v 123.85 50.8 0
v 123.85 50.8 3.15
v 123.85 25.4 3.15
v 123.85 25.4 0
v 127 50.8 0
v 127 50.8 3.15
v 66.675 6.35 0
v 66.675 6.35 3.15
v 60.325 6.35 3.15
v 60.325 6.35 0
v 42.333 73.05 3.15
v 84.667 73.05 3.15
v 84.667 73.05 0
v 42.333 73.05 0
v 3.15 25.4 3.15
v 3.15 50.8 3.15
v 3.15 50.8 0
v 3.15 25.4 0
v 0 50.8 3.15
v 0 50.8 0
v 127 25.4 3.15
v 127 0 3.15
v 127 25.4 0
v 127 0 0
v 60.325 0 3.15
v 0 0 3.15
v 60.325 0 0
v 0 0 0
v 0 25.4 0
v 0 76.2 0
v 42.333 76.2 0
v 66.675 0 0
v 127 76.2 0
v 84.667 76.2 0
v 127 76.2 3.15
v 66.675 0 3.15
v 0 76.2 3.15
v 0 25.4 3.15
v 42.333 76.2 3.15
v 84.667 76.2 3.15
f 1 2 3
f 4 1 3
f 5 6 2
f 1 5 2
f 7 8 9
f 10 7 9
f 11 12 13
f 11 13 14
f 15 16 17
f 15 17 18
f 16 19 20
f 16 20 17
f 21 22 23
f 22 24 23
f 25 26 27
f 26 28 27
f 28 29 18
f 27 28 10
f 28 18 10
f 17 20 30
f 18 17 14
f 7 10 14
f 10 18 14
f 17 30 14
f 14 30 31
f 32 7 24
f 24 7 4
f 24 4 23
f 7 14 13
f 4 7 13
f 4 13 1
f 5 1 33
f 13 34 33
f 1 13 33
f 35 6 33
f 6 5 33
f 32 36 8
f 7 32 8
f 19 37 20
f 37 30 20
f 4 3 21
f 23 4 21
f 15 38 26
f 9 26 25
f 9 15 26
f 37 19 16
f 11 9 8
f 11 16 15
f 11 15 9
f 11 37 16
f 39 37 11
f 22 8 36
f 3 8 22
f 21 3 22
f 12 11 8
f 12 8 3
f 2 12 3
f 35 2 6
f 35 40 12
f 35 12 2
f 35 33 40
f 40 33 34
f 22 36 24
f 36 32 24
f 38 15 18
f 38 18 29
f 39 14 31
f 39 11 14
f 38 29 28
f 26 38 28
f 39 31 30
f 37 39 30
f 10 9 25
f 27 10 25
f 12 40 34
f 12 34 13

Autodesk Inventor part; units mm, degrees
ref_plane "YZ Plane" through (0, 0, 0) normal (1, 0, 0) x (0, 1, 0)
ref_plane "XZ Plane" through (0, 0, 0) normal (0, 1, 0) x (-1, 0, 0)
ref_plane "XY Plane" through (0, 0, 0) normal (0, 0, 1) x (1, 0, 0)
sketch "Sketch1" plane through (0, 0, 0) normal (0, 0, 1) x (1, 0, 0)
  line L0 (0, 0) -> (127, 0)
  line L1 (127, 0) -> (127, 76.2)
  line L2 (127, 76.2) -> (0, 76.2)
  line L3 (0, 76.2) -> (0, 0)
  dimension "d0" = 127
  dimension "d1" = 76.2
extrude "Extrusion1" add sketch "Sketch1" along normal blind 3.1496
sketch "Sketch4" plane through (0, 0, 3.1496) normal (0, 0, 1) x (1, 0, 0)
  line L0 (0, 0) -> (127, 0) projected
  line L1 (127, 0) -> (127, 76.2) projected
  line L2 (127, 76.2) -> (0, 76.2) projected
  line L3 (0, 76.2) -> (0, 0) projected
  line L4 (0, 50.8) -> (3.1496, 50.8)
  line L5 (3.1496, 50.8) -> (3.1496, 25.4)
  line L6 (3.1496, 25.4) -> (0, 25.4)
  line L7 (0, 25.4) -> (0, 50.8)
  line L8 (127, 50.8) -> (123.8504, 50.8)
  line L9 (123.8504, 50.8) -> (123.8504, 25.4)
  line L10 (123.8504, 25.4) -> (127, 25.4)
  line L11 (127, 25.4) -> (127, 50.8)
  line L12 (42.3333, 76.2) -> (84.6667, 76.2)
  line L13 (84.6667, 76.2) -> (84.6667, 73.0504)
  line L14 (84.6667, 73.0504) -> (42.3333, 73.0504)
  line L15 (42.3333, 73.0504) -> (42.3333, 76.2)
  dimension "d7" = 3.1496
  dimension "d8" = 25.4
  dimension "d9" = 25.4
  dimension "d10" = 3.1496
  dimension "d11" = 25.4
  dimension "d12" = 25.4
  dimension "d13" = 42.3333
  dimension "d14" = 3.1496
  dimension "d15" = 42.3333
extrude "Extrusion2" cut sketch "Sketch4" against normal blind 3.1496 contours L3 L4 L5 L6 | L10 L9 L8 L1 | L2 L13 L14 L15
sketch "Sketch5" plane through (0, 0, 3.1496) normal (0, 0, 1) x (1, 0, 0)
  line L0 (0, 25.4) -> (0, 0) projected
  line L1 (0, 0) -> (127, 0) projected
  line L2 (60.325, 0) -> (66.675, 0)
  line L3 (66.675, 0) -> (66.675, 6.35)
  line L4 (66.675, 6.35) -> (60.325, 6.35)
  line L5 (60.325, 6.35) -> (60.325, 0)
  dimension "d18" = 6.35
  dimension "d19" = 6.35
  dimension "d20" = 60.325
extrude "Extrusion3" cut sketch "Sketch5" against normal blind 3.1496
equation "\"d0\" = width"
equation "\"d1\" = height"
equation "\"d2\" = thick"
equation "\"d7\" = thick"
equation "\"d8\" = 0.333333 * height"
equation "\"d9\" = 0.333333 * height"
equation "\"d10\" = thick"
equation "\"d11\" = 0.333333 * height"
equation "\"d12\" = 0.333333 * height"
equation "\"d13\" = 0.333333 * width"
equation "\"d14\" = thick"
equation "\"d15\" = 0.333333 * width"
equation "\"d16\" = thick"
equation "\"d21\" = thick"
equation "\"height\" = 76.2"
equation "\"width\" = 127"
equation "\"thick\" = 3.1496"
properties part number "Front"
